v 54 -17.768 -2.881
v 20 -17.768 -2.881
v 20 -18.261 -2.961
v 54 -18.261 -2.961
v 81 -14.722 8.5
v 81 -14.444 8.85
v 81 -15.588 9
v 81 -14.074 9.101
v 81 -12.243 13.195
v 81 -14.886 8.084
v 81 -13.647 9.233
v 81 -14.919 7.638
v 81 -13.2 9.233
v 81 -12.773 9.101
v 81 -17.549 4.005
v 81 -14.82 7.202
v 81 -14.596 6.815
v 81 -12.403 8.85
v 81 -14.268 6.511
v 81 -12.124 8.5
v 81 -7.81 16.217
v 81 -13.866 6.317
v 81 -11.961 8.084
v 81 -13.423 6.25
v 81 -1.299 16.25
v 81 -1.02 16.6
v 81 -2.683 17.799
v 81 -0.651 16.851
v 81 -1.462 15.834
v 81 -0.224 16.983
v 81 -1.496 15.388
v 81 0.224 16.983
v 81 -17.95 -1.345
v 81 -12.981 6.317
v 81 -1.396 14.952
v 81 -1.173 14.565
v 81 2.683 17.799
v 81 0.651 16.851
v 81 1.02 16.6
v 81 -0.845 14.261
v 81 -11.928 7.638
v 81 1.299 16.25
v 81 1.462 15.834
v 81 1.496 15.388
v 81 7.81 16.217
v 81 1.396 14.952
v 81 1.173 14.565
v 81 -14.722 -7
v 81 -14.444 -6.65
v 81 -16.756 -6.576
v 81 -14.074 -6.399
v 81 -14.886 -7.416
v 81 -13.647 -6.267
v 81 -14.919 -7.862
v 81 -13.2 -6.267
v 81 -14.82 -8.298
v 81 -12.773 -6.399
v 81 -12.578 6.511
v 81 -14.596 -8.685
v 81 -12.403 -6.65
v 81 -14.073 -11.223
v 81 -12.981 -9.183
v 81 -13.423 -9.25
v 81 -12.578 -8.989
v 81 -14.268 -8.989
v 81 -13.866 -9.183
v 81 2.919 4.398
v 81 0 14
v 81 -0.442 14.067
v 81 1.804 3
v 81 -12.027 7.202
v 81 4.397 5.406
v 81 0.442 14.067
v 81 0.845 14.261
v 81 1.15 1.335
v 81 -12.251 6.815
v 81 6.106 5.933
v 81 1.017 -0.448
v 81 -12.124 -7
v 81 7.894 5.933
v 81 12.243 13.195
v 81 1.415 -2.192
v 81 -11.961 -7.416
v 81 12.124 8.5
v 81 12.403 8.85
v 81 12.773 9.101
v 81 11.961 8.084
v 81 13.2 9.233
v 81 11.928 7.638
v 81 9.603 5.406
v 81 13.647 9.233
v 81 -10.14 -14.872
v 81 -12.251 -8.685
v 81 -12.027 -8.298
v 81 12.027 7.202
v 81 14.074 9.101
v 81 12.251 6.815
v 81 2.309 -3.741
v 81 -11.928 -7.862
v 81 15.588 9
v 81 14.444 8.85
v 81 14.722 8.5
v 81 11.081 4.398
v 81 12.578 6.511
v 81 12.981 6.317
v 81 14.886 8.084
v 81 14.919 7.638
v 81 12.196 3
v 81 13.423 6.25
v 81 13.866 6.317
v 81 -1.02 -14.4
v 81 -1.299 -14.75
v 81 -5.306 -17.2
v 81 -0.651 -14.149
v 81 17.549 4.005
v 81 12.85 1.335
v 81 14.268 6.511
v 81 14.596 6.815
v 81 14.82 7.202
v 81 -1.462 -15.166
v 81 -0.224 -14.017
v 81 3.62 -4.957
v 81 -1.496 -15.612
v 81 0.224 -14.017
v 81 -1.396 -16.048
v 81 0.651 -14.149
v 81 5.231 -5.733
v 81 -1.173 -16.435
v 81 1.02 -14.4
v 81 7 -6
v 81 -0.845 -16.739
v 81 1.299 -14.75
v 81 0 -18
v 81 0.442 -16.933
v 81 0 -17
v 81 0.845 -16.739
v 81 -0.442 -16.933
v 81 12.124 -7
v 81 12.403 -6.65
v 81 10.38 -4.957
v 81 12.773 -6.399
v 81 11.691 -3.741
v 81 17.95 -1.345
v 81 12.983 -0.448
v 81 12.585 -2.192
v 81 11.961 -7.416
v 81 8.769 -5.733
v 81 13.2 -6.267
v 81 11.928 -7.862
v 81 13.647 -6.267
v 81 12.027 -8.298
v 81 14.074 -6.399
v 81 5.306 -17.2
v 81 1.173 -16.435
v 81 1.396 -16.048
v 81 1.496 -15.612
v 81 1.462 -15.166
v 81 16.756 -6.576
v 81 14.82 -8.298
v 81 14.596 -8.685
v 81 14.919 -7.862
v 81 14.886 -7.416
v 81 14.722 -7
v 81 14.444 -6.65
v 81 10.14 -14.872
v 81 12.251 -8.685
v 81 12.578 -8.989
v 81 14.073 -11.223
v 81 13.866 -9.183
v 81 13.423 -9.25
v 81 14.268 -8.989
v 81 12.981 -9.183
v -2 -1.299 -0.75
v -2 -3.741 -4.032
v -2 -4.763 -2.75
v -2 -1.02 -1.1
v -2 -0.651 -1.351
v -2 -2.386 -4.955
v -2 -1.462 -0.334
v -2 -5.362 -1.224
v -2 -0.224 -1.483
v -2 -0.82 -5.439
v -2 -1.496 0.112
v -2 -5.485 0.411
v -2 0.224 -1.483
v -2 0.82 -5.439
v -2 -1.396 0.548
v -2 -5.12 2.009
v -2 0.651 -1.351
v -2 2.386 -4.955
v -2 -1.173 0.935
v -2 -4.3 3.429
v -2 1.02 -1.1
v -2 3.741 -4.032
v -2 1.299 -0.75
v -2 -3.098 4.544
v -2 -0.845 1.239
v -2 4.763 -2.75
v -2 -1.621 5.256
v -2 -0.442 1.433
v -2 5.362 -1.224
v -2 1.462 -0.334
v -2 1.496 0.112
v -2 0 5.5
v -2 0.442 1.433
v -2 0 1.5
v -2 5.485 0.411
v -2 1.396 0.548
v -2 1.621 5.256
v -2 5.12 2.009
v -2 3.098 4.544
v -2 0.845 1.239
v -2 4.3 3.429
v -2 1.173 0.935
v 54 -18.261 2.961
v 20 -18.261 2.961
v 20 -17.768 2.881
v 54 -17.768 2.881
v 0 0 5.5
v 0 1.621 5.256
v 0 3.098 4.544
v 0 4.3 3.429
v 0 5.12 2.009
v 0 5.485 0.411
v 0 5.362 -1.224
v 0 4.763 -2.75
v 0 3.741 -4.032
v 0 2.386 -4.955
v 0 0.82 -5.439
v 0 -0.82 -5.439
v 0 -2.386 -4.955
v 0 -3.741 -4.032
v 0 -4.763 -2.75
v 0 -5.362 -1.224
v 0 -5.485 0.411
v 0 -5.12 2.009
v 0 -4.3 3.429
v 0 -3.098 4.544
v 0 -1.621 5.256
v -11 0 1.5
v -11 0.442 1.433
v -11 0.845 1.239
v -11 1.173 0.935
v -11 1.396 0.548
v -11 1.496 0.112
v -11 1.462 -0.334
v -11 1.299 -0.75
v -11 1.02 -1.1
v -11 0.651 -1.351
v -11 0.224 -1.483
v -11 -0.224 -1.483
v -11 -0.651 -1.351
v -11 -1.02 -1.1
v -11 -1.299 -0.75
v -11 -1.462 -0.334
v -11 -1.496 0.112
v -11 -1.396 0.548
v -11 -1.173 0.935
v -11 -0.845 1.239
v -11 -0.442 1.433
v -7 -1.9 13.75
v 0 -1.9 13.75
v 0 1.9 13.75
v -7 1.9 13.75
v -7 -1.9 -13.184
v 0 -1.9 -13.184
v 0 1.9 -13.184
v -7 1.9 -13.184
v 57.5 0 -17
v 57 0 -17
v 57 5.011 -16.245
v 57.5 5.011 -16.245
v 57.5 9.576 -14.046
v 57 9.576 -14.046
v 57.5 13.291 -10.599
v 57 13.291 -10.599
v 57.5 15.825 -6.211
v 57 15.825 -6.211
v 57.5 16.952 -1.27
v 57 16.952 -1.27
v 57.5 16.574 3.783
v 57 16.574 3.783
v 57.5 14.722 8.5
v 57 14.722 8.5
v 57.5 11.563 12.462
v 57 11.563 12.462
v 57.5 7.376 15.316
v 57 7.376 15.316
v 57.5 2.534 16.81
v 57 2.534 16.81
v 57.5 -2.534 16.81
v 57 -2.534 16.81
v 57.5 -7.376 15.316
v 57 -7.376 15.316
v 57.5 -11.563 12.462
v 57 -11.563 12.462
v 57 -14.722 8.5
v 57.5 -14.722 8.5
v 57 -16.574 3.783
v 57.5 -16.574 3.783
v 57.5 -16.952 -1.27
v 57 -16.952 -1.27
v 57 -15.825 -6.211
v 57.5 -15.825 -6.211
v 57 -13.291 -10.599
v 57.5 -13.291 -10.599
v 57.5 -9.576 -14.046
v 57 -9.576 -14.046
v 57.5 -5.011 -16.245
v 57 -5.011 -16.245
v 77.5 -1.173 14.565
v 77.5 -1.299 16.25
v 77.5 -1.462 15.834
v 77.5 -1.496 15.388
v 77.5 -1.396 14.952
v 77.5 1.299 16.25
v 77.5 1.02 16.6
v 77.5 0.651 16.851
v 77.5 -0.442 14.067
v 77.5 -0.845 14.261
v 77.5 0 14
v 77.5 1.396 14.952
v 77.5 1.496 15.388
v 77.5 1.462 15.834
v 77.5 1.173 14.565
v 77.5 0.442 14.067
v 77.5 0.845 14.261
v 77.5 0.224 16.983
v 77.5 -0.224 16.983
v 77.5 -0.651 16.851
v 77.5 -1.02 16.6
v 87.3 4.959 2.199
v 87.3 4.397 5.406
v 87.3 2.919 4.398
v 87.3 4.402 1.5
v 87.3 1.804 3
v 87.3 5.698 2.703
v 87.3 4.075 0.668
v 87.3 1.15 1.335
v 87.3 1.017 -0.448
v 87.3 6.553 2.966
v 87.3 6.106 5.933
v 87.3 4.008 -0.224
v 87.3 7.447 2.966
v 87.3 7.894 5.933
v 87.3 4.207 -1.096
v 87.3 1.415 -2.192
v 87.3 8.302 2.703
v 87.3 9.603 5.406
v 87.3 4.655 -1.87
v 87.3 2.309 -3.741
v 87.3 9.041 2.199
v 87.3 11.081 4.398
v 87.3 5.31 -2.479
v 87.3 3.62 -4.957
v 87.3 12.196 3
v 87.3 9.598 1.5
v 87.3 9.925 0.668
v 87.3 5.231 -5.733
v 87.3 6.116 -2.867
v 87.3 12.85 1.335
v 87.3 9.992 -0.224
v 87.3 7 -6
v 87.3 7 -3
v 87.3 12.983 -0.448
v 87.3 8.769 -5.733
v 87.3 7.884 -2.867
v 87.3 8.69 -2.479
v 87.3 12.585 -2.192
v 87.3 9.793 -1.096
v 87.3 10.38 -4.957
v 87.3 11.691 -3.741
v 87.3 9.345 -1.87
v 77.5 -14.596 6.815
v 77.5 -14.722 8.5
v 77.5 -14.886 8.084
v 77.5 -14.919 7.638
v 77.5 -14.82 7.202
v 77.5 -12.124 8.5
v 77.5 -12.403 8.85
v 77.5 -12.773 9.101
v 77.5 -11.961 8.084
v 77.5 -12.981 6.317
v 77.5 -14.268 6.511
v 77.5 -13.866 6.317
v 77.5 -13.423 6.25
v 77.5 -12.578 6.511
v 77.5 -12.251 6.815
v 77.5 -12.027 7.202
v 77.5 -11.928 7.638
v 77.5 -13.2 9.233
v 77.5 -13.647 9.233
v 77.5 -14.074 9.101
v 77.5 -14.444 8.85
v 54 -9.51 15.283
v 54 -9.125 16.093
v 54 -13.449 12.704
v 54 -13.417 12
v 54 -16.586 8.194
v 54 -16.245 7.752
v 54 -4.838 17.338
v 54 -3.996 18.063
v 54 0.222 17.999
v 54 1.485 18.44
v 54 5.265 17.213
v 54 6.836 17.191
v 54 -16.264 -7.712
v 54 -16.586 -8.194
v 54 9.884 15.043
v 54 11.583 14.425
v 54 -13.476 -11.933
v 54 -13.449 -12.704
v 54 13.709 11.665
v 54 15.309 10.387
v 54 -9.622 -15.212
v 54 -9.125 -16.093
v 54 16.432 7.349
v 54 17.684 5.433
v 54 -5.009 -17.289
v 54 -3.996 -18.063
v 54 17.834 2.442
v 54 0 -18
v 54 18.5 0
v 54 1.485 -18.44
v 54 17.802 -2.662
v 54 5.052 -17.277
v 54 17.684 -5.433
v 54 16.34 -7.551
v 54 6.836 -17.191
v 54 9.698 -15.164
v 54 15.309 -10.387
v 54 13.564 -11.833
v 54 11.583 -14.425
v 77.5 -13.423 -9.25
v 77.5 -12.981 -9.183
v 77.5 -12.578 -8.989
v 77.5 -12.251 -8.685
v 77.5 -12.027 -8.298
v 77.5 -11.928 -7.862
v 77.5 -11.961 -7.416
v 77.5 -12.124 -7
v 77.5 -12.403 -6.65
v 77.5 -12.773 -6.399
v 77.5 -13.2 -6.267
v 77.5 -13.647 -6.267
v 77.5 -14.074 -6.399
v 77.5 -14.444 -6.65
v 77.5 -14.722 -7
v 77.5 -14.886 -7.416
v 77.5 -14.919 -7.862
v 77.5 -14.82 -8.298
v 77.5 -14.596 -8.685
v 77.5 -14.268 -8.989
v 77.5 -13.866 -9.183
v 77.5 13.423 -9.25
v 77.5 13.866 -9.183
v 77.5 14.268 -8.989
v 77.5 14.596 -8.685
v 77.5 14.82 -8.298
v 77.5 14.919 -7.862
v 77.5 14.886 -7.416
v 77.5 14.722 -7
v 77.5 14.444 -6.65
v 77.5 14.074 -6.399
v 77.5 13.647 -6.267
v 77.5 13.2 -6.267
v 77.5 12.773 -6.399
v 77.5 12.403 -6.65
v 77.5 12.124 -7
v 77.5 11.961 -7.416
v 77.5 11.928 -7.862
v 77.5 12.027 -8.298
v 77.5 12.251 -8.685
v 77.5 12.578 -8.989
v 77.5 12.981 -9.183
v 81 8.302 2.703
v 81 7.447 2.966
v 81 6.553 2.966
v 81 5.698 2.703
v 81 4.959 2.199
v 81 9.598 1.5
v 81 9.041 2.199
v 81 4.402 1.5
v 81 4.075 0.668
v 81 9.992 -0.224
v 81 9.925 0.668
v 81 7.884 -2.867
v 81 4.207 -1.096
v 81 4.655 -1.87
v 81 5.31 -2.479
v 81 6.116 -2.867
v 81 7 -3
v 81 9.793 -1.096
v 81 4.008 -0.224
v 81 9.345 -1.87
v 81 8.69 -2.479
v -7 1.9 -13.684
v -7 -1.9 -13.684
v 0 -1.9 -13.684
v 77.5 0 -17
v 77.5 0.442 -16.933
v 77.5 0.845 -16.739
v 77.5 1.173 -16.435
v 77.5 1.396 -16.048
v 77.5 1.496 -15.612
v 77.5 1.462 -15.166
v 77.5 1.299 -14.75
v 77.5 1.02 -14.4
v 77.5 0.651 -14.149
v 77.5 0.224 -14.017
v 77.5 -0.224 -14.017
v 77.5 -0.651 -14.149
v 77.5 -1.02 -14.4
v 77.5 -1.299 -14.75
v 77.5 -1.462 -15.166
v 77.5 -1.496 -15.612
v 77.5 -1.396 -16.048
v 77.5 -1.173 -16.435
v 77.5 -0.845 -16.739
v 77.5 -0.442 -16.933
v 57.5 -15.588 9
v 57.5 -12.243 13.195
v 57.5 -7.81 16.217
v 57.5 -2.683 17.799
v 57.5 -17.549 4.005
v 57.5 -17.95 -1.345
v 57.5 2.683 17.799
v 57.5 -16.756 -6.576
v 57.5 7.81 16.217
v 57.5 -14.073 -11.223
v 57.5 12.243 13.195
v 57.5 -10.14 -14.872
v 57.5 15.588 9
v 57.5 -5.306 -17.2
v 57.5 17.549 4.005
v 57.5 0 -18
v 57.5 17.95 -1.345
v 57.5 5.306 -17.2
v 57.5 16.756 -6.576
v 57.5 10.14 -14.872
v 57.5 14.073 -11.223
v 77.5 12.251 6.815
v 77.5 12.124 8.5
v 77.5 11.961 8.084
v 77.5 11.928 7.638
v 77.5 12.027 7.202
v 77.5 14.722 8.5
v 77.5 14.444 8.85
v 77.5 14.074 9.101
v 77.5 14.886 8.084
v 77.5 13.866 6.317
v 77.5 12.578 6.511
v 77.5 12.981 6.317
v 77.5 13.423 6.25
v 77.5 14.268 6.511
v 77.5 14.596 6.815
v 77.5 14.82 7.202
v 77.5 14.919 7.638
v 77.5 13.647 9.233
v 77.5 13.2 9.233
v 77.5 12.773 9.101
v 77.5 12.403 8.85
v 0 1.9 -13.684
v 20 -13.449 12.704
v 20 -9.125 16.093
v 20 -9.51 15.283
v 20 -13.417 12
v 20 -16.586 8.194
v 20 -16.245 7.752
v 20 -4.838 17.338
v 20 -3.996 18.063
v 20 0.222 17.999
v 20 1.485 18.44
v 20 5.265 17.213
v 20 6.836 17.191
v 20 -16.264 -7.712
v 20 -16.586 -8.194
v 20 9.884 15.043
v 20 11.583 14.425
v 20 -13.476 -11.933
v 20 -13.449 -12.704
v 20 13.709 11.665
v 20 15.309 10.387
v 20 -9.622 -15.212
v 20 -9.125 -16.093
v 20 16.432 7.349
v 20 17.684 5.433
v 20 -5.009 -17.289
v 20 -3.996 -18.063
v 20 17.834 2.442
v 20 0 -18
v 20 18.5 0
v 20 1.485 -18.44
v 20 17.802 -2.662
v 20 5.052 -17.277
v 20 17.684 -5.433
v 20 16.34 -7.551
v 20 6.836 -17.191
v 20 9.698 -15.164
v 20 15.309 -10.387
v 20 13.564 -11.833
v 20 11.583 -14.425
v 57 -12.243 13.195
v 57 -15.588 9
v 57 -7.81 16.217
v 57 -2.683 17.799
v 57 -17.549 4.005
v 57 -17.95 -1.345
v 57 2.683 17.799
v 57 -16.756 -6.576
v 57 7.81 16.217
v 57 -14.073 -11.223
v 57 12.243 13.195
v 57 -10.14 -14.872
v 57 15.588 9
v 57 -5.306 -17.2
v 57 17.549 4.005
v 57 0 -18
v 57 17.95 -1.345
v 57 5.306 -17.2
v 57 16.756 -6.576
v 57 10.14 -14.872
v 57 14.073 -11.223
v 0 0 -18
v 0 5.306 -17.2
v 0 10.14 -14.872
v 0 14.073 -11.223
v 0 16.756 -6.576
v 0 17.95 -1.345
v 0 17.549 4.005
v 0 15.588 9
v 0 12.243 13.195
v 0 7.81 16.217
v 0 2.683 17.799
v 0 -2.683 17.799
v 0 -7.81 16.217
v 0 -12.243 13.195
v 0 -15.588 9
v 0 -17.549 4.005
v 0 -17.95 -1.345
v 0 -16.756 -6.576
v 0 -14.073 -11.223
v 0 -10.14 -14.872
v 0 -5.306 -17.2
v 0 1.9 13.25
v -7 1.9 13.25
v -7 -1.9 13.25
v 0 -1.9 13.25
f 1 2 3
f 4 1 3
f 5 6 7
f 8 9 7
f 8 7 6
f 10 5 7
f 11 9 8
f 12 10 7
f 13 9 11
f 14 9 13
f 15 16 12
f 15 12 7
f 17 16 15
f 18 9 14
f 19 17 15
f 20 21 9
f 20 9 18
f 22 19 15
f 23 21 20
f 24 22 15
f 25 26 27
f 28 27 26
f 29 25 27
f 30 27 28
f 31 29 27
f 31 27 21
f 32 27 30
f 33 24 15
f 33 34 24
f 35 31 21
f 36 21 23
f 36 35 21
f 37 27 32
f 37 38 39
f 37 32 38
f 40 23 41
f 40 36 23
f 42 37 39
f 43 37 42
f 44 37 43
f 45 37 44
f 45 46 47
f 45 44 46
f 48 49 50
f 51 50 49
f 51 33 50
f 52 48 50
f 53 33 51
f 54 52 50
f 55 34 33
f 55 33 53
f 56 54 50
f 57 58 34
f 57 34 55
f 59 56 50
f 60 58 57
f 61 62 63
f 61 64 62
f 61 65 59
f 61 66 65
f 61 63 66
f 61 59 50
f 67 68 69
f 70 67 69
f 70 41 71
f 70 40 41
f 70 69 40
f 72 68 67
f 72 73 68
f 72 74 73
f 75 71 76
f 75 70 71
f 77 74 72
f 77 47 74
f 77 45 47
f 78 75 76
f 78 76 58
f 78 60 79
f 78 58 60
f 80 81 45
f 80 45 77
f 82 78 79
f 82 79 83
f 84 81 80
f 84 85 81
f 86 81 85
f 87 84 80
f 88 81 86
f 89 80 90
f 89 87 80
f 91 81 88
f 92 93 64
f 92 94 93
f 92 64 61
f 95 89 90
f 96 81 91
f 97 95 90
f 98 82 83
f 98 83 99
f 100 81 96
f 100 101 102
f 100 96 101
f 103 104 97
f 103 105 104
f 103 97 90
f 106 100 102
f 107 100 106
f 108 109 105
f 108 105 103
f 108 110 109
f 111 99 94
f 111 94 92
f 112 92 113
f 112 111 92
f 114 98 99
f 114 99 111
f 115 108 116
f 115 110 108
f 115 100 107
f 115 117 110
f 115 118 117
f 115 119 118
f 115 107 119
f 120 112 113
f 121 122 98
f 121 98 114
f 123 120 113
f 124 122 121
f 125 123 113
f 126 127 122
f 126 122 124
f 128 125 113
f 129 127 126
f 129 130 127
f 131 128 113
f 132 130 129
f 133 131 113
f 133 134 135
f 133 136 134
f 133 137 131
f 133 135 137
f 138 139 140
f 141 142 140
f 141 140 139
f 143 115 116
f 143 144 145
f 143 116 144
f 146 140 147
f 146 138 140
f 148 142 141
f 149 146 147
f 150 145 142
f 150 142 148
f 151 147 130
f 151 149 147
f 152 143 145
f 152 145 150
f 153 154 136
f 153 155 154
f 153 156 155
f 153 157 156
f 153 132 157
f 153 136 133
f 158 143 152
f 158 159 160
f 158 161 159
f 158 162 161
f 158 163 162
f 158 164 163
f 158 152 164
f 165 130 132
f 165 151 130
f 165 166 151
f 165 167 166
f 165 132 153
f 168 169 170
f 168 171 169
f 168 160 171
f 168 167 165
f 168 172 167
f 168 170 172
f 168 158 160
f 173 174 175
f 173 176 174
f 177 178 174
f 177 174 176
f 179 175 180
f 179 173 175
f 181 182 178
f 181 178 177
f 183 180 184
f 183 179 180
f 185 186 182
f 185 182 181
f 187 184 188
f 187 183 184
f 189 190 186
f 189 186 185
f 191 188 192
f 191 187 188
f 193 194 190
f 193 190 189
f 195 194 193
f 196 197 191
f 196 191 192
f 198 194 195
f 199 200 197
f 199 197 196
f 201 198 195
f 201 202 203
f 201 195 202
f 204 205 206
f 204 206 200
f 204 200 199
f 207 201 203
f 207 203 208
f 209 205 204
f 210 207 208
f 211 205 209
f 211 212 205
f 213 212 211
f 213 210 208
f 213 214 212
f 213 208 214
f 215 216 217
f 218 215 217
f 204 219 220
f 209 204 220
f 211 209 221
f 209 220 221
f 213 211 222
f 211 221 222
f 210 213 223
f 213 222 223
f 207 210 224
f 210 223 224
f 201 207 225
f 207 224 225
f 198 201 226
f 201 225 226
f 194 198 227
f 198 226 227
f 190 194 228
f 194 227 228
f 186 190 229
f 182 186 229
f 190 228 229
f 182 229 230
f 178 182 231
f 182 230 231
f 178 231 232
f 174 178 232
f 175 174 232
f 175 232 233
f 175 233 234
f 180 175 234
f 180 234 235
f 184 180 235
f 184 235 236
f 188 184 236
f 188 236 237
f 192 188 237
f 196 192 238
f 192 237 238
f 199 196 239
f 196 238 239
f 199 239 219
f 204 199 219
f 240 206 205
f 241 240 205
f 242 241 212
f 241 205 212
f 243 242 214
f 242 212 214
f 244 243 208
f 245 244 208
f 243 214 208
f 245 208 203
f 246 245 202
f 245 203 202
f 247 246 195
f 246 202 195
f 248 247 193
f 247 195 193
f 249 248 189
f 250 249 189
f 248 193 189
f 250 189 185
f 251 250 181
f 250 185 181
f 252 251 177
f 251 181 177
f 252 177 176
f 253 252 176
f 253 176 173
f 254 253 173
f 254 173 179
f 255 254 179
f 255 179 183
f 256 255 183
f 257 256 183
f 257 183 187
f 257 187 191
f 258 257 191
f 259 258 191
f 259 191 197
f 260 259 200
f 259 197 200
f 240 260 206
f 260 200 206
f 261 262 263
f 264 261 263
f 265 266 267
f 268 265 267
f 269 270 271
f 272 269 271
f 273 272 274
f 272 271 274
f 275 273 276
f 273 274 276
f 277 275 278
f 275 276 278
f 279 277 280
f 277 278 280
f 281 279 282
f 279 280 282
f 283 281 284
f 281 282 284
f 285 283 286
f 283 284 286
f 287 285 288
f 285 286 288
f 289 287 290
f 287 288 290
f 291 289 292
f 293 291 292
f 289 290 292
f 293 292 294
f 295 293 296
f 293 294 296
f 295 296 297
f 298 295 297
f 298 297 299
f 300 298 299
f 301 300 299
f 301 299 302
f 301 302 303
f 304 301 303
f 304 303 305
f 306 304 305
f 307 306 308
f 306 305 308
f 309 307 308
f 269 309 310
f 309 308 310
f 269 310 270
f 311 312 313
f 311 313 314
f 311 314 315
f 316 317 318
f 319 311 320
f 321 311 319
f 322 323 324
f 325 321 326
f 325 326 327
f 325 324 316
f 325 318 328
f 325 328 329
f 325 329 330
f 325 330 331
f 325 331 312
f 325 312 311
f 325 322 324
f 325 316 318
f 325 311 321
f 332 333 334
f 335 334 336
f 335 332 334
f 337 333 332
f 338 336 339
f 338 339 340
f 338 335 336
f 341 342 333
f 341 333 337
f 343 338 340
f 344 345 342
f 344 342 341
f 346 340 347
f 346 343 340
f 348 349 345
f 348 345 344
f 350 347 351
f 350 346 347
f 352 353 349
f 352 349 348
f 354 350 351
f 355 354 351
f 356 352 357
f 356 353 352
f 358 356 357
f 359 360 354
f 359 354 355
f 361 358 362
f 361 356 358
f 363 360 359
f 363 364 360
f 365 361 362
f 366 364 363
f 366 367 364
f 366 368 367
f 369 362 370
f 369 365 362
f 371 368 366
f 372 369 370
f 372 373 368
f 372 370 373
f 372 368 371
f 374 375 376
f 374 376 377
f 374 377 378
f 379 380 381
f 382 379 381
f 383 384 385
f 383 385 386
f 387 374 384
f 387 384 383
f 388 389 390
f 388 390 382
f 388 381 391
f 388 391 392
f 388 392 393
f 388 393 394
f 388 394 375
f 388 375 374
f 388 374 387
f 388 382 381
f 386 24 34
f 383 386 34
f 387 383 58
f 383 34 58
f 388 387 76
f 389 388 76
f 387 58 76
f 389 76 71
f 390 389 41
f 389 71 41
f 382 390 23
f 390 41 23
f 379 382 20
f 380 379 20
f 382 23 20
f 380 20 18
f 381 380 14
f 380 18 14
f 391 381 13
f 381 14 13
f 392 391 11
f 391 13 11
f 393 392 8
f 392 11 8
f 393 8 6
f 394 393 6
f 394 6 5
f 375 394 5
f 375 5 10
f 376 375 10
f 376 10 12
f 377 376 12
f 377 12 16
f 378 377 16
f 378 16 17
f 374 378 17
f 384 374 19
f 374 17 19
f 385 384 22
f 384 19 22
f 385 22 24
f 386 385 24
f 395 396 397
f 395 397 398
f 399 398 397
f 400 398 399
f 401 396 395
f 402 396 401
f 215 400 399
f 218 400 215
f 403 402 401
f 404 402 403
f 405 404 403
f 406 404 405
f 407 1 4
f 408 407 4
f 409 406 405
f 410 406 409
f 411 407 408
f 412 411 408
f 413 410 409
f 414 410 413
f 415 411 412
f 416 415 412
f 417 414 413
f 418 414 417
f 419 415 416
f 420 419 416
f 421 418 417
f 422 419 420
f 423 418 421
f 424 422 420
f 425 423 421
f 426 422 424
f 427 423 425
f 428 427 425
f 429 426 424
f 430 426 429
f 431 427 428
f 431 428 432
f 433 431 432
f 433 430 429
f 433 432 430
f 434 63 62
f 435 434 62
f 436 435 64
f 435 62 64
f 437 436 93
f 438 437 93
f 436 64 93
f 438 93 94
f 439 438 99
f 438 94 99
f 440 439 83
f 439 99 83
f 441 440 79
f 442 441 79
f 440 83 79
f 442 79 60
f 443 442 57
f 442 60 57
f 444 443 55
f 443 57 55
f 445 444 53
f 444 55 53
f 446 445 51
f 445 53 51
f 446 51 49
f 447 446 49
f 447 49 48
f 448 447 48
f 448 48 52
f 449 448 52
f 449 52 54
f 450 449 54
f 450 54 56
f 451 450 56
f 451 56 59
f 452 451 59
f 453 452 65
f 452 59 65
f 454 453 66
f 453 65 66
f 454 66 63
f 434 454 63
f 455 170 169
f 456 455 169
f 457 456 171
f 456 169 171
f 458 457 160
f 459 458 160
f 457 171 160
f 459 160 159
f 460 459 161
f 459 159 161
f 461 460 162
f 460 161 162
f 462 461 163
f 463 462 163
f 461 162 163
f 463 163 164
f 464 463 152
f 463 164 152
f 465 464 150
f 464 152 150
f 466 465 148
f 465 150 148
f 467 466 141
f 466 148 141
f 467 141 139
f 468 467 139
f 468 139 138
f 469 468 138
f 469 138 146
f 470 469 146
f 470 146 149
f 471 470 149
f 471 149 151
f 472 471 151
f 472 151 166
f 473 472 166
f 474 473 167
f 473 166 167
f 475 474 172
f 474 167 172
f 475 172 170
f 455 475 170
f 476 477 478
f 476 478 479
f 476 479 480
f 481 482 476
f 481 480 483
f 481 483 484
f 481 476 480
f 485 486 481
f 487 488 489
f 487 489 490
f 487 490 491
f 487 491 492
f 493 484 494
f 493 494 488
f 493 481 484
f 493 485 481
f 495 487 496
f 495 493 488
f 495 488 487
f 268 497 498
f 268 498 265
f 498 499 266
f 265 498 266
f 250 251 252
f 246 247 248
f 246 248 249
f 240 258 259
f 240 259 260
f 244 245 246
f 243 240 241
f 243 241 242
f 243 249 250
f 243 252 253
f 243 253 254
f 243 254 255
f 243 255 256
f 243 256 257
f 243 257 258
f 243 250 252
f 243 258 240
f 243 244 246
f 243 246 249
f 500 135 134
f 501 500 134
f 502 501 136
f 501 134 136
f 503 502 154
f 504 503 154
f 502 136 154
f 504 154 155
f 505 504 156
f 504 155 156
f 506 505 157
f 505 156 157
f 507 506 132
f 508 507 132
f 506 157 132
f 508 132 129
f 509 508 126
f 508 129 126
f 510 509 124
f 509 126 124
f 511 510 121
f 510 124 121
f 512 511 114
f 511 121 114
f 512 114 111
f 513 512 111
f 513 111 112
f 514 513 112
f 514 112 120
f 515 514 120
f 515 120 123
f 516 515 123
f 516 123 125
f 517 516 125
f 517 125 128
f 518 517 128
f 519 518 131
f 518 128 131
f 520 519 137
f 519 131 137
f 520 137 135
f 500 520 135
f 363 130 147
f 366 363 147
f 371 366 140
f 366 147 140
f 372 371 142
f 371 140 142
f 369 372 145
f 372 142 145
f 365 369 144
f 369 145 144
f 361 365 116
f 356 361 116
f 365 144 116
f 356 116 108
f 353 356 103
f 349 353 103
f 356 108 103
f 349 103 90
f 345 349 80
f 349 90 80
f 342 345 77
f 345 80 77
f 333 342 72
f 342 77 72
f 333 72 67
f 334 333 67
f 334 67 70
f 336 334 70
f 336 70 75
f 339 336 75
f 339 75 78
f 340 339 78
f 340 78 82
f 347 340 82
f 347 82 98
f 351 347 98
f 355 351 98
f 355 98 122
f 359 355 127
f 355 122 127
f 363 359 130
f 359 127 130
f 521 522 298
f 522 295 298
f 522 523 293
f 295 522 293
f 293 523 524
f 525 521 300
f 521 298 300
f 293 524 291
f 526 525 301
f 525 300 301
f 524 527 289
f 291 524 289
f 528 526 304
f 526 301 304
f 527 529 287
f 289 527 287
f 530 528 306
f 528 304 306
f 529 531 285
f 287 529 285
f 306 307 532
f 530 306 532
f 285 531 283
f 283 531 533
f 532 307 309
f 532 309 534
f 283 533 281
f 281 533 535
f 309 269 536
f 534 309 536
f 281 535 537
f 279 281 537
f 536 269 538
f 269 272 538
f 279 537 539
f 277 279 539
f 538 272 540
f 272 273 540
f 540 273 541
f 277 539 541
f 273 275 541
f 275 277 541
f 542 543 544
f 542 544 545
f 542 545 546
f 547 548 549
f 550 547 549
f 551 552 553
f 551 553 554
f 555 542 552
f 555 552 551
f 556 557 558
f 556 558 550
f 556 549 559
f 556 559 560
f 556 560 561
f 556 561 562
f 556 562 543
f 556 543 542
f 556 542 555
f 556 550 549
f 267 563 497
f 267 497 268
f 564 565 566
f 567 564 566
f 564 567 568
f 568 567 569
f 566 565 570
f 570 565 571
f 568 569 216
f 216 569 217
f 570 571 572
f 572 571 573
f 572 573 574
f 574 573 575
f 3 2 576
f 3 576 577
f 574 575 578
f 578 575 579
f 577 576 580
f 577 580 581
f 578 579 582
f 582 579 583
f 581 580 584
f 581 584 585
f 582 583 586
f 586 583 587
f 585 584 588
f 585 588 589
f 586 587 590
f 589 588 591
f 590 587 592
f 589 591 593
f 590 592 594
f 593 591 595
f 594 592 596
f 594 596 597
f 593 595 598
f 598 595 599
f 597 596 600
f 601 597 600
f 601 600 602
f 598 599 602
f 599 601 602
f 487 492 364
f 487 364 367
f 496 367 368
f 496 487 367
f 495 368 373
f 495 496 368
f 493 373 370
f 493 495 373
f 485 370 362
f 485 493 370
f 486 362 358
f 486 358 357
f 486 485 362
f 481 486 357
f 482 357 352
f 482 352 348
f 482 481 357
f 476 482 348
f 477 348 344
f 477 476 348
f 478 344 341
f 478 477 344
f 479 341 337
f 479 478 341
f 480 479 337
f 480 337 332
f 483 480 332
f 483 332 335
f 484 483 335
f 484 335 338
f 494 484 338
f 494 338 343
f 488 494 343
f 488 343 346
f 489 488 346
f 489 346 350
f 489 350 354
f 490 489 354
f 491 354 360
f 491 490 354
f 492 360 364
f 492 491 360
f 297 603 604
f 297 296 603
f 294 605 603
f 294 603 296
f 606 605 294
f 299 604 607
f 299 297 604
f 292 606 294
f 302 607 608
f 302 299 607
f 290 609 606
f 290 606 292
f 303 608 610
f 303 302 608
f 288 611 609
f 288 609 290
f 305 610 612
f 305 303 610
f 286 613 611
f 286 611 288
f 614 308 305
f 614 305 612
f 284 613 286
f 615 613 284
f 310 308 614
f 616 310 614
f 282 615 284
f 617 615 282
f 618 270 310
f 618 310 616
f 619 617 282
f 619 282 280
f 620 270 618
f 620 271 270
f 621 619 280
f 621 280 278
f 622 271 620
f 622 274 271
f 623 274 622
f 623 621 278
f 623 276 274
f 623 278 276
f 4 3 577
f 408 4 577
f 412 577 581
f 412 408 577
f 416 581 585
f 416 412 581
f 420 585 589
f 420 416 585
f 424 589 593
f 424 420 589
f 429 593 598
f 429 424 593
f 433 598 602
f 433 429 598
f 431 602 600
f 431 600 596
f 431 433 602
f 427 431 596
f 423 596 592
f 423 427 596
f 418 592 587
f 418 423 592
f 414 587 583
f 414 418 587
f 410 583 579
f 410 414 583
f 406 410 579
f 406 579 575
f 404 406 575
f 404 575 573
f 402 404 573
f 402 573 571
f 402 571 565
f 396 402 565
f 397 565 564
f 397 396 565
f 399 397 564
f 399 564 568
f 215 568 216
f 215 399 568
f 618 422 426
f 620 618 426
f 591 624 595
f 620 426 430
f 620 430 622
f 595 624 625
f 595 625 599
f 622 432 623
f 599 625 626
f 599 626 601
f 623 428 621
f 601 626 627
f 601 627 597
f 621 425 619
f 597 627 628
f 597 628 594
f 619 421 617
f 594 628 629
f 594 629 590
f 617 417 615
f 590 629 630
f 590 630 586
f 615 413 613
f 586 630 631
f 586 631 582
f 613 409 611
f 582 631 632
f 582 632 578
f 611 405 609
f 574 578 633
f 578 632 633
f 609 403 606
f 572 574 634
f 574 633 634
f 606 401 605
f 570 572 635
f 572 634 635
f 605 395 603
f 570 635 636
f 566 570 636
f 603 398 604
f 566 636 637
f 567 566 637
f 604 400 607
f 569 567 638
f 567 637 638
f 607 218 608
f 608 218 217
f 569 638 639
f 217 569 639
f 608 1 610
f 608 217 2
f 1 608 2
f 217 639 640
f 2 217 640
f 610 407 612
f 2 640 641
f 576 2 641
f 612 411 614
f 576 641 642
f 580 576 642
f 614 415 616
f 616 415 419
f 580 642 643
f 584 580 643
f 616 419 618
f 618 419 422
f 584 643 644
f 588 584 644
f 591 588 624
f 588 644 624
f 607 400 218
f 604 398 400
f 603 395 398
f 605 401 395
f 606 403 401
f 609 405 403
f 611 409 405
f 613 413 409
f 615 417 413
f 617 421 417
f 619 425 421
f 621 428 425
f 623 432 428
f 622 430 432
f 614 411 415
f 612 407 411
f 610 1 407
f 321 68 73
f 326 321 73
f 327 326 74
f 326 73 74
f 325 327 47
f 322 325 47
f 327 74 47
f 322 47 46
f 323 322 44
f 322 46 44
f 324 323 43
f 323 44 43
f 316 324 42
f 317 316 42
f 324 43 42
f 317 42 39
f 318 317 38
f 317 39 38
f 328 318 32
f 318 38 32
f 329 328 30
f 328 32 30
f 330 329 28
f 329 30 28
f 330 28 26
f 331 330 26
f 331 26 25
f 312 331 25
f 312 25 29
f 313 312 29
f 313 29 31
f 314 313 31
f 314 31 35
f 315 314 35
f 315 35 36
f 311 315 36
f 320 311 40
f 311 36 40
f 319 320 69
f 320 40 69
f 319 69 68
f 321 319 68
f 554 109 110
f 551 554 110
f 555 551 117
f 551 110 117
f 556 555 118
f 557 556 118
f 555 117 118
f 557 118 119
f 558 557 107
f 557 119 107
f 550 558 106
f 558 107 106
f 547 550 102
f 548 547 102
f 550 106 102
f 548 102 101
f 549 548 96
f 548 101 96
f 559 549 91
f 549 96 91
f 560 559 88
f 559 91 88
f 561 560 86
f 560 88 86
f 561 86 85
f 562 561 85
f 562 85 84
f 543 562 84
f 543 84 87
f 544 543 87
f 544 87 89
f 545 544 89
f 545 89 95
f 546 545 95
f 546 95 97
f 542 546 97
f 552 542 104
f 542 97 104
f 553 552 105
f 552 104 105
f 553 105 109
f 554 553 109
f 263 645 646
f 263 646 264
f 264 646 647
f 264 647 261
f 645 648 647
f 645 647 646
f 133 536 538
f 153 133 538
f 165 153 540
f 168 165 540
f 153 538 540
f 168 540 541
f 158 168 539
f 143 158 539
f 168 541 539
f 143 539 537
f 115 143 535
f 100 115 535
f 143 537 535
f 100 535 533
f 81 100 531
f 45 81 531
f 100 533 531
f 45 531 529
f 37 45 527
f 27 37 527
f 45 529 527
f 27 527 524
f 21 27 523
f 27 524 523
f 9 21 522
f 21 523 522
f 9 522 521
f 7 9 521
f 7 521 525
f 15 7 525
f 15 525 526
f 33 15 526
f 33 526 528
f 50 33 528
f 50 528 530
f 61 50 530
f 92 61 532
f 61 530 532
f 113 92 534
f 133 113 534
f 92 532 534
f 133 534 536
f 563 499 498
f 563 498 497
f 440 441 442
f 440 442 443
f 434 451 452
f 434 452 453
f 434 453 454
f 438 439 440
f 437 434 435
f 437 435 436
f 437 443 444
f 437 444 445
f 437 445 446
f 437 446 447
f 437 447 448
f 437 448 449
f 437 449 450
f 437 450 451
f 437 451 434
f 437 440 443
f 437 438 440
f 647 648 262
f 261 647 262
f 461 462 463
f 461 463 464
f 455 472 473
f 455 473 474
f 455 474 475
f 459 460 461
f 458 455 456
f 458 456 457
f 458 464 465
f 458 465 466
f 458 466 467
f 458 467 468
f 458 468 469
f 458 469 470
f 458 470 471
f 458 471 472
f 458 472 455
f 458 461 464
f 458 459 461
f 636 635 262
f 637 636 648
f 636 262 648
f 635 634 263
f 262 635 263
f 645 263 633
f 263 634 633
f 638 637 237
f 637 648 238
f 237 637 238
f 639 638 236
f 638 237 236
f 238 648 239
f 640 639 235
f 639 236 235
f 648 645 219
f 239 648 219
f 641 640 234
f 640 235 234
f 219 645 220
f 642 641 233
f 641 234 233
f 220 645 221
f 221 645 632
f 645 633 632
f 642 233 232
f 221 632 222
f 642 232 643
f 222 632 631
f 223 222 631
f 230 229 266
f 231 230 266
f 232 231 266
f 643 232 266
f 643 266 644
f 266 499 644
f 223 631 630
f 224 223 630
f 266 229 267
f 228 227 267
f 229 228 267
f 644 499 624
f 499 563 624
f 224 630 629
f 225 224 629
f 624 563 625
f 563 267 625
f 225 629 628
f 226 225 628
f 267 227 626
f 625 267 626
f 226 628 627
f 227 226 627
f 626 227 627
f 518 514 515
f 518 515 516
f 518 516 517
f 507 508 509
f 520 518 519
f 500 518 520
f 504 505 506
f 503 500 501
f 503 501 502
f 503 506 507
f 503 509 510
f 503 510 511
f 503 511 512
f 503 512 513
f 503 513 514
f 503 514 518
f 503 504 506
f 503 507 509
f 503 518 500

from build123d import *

# Parameters (mm, degrees)
SKETCH1_R           = 18
BOSS_EXTRUDE1_DEPTH = 57
SKETCH2_R           = 17
BOSS_EXTRUDE2_DEPTH = 0.5
SKETCH3_R           = 18
BOSS_EXTRUDE3_DEPTH = 23.5
SKETCH4_R           = 6
SKETCH4_R_2         = 3
BOSS_EXTRUDE4_DEPTH = 6.3
SKETCH6_R           = 1.5
CUT_EXTRUDE1_DEPTH  = 3.5
SKETCH7_R           = 5.5
BOSS_EXTRUDE6_DEPTH = 2
SKETCH8_R           = 1.5
BOSS_EXTRUDE7_DEPTH = 9
SKETCH9_W           = 0.5
SKETCH9_H           = 3.8
BOSS_EXTRUDE8_DEPTH = 7
BOSS_EXTRUDE9_DEPTH = 34


with BuildPart() as part:
    # Sketch1 → Boss-Extrude1 (new body)
    with BuildSketch(Plane(origin=(0, 0, 0), x_dir=(0, 0, -1), z_dir=(1, 0, 0))):
        Circle(SKETCH1_R)
    extrude(amount=BOSS_EXTRUDE1_DEPTH)

    # Sketch2 → Boss-Extrude2 (add)
    with BuildSketch(Plane(origin=(57, 0, 0), x_dir=(0, 0, -1), z_dir=(1, 0, 0))):
        Circle(SKETCH2_R)
    extrude(amount=BOSS_EXTRUDE2_DEPTH)

    # Sketch3 → Boss-Extrude3 (add)
    with BuildSketch(Plane(origin=(57.5, 0, 0), x_dir=(0, 0, -1), z_dir=(1, 0, 0))):
        Circle(SKETCH3_R)
    extrude(amount=BOSS_EXTRUDE3_DEPTH)

    # Sketch4 → Boss-Extrude4 (add)
    with BuildSketch(Plane(origin=(81, 0, 0), x_dir=(0, 0, -1), z_dir=(1, 0, 0))):
        with Locations((0, 7)):
            Circle(SKETCH4_R)
        with Locations((0, 7)):
            Circle(SKETCH4_R_2, mode=Mode.SUBTRACT)
    extrude(amount=BOSS_EXTRUDE4_DEPTH)

    # Sketch6 → Cut-Extrude1 (cut)
    with BuildSketch(Plane(origin=(81, 0, 0), x_dir=(0, 0, -1), z_dir=(1, 0, 0))):
        with Locations((-15.5, 0)):
            Circle(SKETCH6_R)
        with Locations((-7.75, 13.423393759)):
            Circle(SKETCH6_R)
        with Locations((7.75, 13.423393759)):
            Circle(SKETCH6_R)
        with Locations((15.5, 0)):
            Circle(SKETCH6_R)
        with Locations((7.75, -13.423393759)):
            Circle(SKETCH6_R)
        with Locations((-7.75, -13.423393759)):
            Circle(SKETCH6_R)
    extrude(amount=-CUT_EXTRUDE1_DEPTH, mode=Mode.SUBTRACT)

    # Sketch7 → Boss-Extrude6 (add)
    with BuildSketch(Plane.ZY):
        Circle(SKETCH7_R)
    extrude(amount=BOSS_EXTRUDE6_DEPTH)

    # Sketch8 → Boss-Extrude7 (add)
    with BuildSketch(Plane.ZY.offset(2)):
        Circle(SKETCH8_R)
    extrude(amount=BOSS_EXTRUDE7_DEPTH)

    # Sketch9 → Boss-Extrude8 (add)
    with BuildSketch(Plane.ZY):
        with Locations((13.5, 0)):
            Rectangle(SKETCH9_W, SKETCH9_H)
        with Locations((-13.434451739, 0)):
            Rectangle(SKETCH9_W, SKETCH9_H)
    extrude(amount=BOSS_EXTRUDE8_DEPTH)

    # Sketch10 → Boss-Extrude9 (add)
    with BuildSketch(Plane(origin=(54, 0, 0), x_dir=(0, 0, -1), z_dir=(1, 0, 0))):
        with BuildLine():
            Line((2.881280854, -17.767898599), (2.961316433, -18.261451338))
            ThreePointArc((2.961316433, -18.261451338), (0, 18.5), (-2.961316433, -18.261451338))
            Line((-2.961316433, -18.261451338), (-2.881280854, -17.767898599))
            ThreePointArc((-2.881280854, -17.767898599), (0, 18), (2.881280854, -17.767898599))
        make_face()
    extrude(amount=-BOSS_EXTRUDE9_DEPTH)


solid = part.part
